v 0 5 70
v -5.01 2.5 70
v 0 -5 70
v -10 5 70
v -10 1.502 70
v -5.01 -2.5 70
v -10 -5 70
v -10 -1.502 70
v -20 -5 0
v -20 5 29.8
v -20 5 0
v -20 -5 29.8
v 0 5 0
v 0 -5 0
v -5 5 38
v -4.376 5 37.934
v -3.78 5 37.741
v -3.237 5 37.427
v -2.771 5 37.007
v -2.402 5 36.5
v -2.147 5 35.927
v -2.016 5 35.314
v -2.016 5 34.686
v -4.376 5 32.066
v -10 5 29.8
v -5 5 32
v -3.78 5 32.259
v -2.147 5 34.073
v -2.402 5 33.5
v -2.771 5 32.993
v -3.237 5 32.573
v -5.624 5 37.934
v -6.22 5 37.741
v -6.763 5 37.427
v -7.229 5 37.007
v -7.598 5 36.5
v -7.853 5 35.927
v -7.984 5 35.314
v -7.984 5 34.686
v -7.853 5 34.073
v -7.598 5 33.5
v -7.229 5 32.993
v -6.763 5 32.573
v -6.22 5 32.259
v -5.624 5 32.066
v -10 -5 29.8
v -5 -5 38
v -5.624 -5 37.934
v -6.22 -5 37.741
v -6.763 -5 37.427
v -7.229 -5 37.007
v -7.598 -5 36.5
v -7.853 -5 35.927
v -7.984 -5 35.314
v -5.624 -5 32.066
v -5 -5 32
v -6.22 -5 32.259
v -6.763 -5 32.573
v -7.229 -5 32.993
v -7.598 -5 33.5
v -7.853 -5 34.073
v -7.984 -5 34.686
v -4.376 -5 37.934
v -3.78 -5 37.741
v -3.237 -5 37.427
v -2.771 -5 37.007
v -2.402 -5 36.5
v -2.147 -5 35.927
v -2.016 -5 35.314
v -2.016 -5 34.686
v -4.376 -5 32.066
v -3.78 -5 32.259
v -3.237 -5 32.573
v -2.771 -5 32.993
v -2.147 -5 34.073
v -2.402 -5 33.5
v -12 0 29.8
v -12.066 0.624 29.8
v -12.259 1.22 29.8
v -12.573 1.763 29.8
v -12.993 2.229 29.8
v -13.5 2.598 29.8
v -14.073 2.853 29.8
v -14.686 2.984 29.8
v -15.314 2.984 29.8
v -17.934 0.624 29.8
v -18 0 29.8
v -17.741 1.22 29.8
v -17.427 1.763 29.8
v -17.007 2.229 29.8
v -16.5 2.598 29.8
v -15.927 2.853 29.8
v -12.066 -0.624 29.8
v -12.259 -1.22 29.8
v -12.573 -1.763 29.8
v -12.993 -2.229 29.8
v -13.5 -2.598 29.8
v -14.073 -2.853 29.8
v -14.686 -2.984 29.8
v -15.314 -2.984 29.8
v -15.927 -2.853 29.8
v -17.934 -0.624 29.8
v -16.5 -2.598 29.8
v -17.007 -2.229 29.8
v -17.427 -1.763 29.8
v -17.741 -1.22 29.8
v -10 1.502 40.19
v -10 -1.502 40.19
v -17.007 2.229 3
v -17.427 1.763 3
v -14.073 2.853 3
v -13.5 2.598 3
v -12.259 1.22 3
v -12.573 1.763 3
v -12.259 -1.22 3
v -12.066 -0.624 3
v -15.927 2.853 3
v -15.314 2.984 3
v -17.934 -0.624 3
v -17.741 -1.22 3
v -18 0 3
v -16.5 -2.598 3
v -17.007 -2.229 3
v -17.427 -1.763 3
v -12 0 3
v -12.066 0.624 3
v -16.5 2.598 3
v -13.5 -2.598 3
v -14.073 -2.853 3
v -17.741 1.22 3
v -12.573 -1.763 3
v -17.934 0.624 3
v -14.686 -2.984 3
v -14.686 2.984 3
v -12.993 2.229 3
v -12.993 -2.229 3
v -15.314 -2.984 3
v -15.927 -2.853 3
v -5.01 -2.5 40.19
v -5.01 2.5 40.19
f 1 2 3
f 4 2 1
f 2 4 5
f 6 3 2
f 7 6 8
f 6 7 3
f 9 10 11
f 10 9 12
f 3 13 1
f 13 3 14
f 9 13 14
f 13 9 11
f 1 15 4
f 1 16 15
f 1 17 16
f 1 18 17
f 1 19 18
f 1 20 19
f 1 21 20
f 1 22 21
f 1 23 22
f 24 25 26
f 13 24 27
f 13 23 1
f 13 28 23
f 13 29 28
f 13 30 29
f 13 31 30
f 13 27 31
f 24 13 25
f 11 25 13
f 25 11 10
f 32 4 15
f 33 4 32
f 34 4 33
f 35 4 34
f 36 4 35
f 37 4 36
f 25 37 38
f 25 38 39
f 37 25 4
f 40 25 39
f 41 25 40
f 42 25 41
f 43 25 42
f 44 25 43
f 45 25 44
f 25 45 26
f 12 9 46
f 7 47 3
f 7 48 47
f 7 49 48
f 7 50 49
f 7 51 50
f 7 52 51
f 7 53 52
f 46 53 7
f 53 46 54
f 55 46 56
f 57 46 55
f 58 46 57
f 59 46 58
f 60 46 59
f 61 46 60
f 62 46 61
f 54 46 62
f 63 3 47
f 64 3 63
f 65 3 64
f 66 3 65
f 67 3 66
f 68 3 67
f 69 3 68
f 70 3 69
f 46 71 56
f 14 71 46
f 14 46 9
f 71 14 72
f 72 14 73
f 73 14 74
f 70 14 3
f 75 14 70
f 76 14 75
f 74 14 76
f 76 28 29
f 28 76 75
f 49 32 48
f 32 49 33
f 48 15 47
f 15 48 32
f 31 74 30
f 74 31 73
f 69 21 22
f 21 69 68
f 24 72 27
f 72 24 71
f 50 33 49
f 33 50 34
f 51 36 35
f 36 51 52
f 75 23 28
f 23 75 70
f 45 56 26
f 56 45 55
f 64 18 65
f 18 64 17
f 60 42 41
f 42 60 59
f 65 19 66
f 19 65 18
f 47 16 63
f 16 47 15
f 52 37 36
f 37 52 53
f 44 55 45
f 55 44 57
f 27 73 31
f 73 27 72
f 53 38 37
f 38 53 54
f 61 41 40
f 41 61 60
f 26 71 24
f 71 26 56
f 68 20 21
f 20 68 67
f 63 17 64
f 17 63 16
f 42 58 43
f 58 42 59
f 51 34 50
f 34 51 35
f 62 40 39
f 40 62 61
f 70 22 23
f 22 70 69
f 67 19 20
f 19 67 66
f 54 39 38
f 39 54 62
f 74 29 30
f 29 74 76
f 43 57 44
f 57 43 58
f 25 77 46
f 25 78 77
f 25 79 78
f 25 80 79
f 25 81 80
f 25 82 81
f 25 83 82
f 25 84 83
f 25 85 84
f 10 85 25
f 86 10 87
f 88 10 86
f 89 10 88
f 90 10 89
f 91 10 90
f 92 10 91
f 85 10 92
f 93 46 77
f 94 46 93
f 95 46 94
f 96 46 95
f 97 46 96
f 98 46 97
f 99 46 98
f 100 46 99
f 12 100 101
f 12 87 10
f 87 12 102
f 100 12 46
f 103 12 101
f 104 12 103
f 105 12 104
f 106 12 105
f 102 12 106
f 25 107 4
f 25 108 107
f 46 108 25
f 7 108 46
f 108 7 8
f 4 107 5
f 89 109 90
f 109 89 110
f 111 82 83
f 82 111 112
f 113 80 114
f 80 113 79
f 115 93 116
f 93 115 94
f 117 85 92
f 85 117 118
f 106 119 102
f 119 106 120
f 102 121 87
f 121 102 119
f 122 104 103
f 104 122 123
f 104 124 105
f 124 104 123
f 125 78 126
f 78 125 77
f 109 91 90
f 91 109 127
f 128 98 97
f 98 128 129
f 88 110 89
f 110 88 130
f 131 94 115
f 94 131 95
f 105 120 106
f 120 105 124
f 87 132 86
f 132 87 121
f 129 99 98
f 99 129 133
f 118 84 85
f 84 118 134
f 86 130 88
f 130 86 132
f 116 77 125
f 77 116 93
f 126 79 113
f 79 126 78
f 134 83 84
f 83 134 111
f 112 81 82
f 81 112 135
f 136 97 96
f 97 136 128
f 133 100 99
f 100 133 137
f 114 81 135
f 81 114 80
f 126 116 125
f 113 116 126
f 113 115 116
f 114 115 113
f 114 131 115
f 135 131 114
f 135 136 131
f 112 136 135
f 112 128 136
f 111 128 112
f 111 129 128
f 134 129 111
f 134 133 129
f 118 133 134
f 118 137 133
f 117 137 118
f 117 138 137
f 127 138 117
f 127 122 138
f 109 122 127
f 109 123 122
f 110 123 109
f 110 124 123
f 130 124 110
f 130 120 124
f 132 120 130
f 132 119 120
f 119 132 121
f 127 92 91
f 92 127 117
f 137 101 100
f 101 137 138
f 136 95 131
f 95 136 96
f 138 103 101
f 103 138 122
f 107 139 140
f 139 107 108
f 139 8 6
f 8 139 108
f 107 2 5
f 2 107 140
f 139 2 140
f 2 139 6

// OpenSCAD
// Puzzle

EPS=0.01;
$fs=0.2;


RadiusOfHole=3;
ClearanceRod=0.5;
ClearanceRodLength=2;
ClearenceGroove=0.4;
ClearanceJoin=0.3;

Height=20;
Width=10;
Length=70;

MaterialAfterHole=3;

HoleLength=Length-2*MaterialAfterHole;

JoinSmall=3;
JoinWide=5;
JoinHight=5;

module thing() {

  translate([0,0,Height/2]) difference() {
    cube(size=[Length,Width,Height], center=true);
    translate([0,Width/2+EPS,-Height/4]) rotate(90,[1,0,0])
        cylinder(h=Width+2*EPS, r=RadiusOfHole);
    translate([0,0,Height/2]) rotate(90, [0,0,1])
        cube(size=[Length,Width+ClearenceGroove,Height], center=true);
    translate([-HoleLength/2,0,Height/4]) rotate(90,[0,1,0])
        cylinder(h=HoleLength, r=RadiusOfHole);
  }
}

module rod() {
    R=RadiusOfHole-ClearanceRod/2;

    translate([0,0,4*R/5]) rotate(-90,[0,1,0])
        intersection() {
            cylinder(h=(HoleLength-Width)/2-ClearanceRodLength, r=R);
            translate([R/5,0,0])
                cube(size=[R*2,R*2,HoleLength], center=true);
        }
}

module join(Clearance) {
    rotate(-90, [0,0,1]) rotate(-90, [1,0,0])
    linear_extrude(height = Length, center = false)
    polygon(points = [ [(-JoinSmall+Clearance)/2, 0], [(JoinSmall-Clearance)/2,0],
        [(JoinWide-Clearance)/2,JoinHight-Clearance],
        [(-JoinWide+Clearance)/2,JoinHight-Clearance] ]);
}

module cut(clearanceJoin) {
    translate([(Width+ClearenceGroove)/2-EPS,-Width/2-EPS,Height/2])
    union() {
        cube(size=[Length,Width+2*EPS,Height+2*EPS], center=false);
        translate([0, (Width+2*EPS)/2,EPS]) join(clearanceJoin);
    }
}

module cutInTwoPartsForAssembly() {
    translate([0,0,Length/2]) {
        rotate(-90,[0,1,0])
          difference() {
            thing();
            cut(0);
          }

        /*
        translate([10,0,0]) rotate(90,[0,1,0])
          intersection() {
            thing();
            cut(ClearanceJoin);
          }
         */
    }
}

//translate([0,-Width,0]) rod();
//translate([HoleLength/2,-Width,0]) rod();
//translate([0,Width,0]) rod();
//translate([HoleLength/2,Width,0]) rod();
cutInTwoPartsForAssembly();
// translate([0,2*Width,0]) cutInTwoPartsForAssembly();
